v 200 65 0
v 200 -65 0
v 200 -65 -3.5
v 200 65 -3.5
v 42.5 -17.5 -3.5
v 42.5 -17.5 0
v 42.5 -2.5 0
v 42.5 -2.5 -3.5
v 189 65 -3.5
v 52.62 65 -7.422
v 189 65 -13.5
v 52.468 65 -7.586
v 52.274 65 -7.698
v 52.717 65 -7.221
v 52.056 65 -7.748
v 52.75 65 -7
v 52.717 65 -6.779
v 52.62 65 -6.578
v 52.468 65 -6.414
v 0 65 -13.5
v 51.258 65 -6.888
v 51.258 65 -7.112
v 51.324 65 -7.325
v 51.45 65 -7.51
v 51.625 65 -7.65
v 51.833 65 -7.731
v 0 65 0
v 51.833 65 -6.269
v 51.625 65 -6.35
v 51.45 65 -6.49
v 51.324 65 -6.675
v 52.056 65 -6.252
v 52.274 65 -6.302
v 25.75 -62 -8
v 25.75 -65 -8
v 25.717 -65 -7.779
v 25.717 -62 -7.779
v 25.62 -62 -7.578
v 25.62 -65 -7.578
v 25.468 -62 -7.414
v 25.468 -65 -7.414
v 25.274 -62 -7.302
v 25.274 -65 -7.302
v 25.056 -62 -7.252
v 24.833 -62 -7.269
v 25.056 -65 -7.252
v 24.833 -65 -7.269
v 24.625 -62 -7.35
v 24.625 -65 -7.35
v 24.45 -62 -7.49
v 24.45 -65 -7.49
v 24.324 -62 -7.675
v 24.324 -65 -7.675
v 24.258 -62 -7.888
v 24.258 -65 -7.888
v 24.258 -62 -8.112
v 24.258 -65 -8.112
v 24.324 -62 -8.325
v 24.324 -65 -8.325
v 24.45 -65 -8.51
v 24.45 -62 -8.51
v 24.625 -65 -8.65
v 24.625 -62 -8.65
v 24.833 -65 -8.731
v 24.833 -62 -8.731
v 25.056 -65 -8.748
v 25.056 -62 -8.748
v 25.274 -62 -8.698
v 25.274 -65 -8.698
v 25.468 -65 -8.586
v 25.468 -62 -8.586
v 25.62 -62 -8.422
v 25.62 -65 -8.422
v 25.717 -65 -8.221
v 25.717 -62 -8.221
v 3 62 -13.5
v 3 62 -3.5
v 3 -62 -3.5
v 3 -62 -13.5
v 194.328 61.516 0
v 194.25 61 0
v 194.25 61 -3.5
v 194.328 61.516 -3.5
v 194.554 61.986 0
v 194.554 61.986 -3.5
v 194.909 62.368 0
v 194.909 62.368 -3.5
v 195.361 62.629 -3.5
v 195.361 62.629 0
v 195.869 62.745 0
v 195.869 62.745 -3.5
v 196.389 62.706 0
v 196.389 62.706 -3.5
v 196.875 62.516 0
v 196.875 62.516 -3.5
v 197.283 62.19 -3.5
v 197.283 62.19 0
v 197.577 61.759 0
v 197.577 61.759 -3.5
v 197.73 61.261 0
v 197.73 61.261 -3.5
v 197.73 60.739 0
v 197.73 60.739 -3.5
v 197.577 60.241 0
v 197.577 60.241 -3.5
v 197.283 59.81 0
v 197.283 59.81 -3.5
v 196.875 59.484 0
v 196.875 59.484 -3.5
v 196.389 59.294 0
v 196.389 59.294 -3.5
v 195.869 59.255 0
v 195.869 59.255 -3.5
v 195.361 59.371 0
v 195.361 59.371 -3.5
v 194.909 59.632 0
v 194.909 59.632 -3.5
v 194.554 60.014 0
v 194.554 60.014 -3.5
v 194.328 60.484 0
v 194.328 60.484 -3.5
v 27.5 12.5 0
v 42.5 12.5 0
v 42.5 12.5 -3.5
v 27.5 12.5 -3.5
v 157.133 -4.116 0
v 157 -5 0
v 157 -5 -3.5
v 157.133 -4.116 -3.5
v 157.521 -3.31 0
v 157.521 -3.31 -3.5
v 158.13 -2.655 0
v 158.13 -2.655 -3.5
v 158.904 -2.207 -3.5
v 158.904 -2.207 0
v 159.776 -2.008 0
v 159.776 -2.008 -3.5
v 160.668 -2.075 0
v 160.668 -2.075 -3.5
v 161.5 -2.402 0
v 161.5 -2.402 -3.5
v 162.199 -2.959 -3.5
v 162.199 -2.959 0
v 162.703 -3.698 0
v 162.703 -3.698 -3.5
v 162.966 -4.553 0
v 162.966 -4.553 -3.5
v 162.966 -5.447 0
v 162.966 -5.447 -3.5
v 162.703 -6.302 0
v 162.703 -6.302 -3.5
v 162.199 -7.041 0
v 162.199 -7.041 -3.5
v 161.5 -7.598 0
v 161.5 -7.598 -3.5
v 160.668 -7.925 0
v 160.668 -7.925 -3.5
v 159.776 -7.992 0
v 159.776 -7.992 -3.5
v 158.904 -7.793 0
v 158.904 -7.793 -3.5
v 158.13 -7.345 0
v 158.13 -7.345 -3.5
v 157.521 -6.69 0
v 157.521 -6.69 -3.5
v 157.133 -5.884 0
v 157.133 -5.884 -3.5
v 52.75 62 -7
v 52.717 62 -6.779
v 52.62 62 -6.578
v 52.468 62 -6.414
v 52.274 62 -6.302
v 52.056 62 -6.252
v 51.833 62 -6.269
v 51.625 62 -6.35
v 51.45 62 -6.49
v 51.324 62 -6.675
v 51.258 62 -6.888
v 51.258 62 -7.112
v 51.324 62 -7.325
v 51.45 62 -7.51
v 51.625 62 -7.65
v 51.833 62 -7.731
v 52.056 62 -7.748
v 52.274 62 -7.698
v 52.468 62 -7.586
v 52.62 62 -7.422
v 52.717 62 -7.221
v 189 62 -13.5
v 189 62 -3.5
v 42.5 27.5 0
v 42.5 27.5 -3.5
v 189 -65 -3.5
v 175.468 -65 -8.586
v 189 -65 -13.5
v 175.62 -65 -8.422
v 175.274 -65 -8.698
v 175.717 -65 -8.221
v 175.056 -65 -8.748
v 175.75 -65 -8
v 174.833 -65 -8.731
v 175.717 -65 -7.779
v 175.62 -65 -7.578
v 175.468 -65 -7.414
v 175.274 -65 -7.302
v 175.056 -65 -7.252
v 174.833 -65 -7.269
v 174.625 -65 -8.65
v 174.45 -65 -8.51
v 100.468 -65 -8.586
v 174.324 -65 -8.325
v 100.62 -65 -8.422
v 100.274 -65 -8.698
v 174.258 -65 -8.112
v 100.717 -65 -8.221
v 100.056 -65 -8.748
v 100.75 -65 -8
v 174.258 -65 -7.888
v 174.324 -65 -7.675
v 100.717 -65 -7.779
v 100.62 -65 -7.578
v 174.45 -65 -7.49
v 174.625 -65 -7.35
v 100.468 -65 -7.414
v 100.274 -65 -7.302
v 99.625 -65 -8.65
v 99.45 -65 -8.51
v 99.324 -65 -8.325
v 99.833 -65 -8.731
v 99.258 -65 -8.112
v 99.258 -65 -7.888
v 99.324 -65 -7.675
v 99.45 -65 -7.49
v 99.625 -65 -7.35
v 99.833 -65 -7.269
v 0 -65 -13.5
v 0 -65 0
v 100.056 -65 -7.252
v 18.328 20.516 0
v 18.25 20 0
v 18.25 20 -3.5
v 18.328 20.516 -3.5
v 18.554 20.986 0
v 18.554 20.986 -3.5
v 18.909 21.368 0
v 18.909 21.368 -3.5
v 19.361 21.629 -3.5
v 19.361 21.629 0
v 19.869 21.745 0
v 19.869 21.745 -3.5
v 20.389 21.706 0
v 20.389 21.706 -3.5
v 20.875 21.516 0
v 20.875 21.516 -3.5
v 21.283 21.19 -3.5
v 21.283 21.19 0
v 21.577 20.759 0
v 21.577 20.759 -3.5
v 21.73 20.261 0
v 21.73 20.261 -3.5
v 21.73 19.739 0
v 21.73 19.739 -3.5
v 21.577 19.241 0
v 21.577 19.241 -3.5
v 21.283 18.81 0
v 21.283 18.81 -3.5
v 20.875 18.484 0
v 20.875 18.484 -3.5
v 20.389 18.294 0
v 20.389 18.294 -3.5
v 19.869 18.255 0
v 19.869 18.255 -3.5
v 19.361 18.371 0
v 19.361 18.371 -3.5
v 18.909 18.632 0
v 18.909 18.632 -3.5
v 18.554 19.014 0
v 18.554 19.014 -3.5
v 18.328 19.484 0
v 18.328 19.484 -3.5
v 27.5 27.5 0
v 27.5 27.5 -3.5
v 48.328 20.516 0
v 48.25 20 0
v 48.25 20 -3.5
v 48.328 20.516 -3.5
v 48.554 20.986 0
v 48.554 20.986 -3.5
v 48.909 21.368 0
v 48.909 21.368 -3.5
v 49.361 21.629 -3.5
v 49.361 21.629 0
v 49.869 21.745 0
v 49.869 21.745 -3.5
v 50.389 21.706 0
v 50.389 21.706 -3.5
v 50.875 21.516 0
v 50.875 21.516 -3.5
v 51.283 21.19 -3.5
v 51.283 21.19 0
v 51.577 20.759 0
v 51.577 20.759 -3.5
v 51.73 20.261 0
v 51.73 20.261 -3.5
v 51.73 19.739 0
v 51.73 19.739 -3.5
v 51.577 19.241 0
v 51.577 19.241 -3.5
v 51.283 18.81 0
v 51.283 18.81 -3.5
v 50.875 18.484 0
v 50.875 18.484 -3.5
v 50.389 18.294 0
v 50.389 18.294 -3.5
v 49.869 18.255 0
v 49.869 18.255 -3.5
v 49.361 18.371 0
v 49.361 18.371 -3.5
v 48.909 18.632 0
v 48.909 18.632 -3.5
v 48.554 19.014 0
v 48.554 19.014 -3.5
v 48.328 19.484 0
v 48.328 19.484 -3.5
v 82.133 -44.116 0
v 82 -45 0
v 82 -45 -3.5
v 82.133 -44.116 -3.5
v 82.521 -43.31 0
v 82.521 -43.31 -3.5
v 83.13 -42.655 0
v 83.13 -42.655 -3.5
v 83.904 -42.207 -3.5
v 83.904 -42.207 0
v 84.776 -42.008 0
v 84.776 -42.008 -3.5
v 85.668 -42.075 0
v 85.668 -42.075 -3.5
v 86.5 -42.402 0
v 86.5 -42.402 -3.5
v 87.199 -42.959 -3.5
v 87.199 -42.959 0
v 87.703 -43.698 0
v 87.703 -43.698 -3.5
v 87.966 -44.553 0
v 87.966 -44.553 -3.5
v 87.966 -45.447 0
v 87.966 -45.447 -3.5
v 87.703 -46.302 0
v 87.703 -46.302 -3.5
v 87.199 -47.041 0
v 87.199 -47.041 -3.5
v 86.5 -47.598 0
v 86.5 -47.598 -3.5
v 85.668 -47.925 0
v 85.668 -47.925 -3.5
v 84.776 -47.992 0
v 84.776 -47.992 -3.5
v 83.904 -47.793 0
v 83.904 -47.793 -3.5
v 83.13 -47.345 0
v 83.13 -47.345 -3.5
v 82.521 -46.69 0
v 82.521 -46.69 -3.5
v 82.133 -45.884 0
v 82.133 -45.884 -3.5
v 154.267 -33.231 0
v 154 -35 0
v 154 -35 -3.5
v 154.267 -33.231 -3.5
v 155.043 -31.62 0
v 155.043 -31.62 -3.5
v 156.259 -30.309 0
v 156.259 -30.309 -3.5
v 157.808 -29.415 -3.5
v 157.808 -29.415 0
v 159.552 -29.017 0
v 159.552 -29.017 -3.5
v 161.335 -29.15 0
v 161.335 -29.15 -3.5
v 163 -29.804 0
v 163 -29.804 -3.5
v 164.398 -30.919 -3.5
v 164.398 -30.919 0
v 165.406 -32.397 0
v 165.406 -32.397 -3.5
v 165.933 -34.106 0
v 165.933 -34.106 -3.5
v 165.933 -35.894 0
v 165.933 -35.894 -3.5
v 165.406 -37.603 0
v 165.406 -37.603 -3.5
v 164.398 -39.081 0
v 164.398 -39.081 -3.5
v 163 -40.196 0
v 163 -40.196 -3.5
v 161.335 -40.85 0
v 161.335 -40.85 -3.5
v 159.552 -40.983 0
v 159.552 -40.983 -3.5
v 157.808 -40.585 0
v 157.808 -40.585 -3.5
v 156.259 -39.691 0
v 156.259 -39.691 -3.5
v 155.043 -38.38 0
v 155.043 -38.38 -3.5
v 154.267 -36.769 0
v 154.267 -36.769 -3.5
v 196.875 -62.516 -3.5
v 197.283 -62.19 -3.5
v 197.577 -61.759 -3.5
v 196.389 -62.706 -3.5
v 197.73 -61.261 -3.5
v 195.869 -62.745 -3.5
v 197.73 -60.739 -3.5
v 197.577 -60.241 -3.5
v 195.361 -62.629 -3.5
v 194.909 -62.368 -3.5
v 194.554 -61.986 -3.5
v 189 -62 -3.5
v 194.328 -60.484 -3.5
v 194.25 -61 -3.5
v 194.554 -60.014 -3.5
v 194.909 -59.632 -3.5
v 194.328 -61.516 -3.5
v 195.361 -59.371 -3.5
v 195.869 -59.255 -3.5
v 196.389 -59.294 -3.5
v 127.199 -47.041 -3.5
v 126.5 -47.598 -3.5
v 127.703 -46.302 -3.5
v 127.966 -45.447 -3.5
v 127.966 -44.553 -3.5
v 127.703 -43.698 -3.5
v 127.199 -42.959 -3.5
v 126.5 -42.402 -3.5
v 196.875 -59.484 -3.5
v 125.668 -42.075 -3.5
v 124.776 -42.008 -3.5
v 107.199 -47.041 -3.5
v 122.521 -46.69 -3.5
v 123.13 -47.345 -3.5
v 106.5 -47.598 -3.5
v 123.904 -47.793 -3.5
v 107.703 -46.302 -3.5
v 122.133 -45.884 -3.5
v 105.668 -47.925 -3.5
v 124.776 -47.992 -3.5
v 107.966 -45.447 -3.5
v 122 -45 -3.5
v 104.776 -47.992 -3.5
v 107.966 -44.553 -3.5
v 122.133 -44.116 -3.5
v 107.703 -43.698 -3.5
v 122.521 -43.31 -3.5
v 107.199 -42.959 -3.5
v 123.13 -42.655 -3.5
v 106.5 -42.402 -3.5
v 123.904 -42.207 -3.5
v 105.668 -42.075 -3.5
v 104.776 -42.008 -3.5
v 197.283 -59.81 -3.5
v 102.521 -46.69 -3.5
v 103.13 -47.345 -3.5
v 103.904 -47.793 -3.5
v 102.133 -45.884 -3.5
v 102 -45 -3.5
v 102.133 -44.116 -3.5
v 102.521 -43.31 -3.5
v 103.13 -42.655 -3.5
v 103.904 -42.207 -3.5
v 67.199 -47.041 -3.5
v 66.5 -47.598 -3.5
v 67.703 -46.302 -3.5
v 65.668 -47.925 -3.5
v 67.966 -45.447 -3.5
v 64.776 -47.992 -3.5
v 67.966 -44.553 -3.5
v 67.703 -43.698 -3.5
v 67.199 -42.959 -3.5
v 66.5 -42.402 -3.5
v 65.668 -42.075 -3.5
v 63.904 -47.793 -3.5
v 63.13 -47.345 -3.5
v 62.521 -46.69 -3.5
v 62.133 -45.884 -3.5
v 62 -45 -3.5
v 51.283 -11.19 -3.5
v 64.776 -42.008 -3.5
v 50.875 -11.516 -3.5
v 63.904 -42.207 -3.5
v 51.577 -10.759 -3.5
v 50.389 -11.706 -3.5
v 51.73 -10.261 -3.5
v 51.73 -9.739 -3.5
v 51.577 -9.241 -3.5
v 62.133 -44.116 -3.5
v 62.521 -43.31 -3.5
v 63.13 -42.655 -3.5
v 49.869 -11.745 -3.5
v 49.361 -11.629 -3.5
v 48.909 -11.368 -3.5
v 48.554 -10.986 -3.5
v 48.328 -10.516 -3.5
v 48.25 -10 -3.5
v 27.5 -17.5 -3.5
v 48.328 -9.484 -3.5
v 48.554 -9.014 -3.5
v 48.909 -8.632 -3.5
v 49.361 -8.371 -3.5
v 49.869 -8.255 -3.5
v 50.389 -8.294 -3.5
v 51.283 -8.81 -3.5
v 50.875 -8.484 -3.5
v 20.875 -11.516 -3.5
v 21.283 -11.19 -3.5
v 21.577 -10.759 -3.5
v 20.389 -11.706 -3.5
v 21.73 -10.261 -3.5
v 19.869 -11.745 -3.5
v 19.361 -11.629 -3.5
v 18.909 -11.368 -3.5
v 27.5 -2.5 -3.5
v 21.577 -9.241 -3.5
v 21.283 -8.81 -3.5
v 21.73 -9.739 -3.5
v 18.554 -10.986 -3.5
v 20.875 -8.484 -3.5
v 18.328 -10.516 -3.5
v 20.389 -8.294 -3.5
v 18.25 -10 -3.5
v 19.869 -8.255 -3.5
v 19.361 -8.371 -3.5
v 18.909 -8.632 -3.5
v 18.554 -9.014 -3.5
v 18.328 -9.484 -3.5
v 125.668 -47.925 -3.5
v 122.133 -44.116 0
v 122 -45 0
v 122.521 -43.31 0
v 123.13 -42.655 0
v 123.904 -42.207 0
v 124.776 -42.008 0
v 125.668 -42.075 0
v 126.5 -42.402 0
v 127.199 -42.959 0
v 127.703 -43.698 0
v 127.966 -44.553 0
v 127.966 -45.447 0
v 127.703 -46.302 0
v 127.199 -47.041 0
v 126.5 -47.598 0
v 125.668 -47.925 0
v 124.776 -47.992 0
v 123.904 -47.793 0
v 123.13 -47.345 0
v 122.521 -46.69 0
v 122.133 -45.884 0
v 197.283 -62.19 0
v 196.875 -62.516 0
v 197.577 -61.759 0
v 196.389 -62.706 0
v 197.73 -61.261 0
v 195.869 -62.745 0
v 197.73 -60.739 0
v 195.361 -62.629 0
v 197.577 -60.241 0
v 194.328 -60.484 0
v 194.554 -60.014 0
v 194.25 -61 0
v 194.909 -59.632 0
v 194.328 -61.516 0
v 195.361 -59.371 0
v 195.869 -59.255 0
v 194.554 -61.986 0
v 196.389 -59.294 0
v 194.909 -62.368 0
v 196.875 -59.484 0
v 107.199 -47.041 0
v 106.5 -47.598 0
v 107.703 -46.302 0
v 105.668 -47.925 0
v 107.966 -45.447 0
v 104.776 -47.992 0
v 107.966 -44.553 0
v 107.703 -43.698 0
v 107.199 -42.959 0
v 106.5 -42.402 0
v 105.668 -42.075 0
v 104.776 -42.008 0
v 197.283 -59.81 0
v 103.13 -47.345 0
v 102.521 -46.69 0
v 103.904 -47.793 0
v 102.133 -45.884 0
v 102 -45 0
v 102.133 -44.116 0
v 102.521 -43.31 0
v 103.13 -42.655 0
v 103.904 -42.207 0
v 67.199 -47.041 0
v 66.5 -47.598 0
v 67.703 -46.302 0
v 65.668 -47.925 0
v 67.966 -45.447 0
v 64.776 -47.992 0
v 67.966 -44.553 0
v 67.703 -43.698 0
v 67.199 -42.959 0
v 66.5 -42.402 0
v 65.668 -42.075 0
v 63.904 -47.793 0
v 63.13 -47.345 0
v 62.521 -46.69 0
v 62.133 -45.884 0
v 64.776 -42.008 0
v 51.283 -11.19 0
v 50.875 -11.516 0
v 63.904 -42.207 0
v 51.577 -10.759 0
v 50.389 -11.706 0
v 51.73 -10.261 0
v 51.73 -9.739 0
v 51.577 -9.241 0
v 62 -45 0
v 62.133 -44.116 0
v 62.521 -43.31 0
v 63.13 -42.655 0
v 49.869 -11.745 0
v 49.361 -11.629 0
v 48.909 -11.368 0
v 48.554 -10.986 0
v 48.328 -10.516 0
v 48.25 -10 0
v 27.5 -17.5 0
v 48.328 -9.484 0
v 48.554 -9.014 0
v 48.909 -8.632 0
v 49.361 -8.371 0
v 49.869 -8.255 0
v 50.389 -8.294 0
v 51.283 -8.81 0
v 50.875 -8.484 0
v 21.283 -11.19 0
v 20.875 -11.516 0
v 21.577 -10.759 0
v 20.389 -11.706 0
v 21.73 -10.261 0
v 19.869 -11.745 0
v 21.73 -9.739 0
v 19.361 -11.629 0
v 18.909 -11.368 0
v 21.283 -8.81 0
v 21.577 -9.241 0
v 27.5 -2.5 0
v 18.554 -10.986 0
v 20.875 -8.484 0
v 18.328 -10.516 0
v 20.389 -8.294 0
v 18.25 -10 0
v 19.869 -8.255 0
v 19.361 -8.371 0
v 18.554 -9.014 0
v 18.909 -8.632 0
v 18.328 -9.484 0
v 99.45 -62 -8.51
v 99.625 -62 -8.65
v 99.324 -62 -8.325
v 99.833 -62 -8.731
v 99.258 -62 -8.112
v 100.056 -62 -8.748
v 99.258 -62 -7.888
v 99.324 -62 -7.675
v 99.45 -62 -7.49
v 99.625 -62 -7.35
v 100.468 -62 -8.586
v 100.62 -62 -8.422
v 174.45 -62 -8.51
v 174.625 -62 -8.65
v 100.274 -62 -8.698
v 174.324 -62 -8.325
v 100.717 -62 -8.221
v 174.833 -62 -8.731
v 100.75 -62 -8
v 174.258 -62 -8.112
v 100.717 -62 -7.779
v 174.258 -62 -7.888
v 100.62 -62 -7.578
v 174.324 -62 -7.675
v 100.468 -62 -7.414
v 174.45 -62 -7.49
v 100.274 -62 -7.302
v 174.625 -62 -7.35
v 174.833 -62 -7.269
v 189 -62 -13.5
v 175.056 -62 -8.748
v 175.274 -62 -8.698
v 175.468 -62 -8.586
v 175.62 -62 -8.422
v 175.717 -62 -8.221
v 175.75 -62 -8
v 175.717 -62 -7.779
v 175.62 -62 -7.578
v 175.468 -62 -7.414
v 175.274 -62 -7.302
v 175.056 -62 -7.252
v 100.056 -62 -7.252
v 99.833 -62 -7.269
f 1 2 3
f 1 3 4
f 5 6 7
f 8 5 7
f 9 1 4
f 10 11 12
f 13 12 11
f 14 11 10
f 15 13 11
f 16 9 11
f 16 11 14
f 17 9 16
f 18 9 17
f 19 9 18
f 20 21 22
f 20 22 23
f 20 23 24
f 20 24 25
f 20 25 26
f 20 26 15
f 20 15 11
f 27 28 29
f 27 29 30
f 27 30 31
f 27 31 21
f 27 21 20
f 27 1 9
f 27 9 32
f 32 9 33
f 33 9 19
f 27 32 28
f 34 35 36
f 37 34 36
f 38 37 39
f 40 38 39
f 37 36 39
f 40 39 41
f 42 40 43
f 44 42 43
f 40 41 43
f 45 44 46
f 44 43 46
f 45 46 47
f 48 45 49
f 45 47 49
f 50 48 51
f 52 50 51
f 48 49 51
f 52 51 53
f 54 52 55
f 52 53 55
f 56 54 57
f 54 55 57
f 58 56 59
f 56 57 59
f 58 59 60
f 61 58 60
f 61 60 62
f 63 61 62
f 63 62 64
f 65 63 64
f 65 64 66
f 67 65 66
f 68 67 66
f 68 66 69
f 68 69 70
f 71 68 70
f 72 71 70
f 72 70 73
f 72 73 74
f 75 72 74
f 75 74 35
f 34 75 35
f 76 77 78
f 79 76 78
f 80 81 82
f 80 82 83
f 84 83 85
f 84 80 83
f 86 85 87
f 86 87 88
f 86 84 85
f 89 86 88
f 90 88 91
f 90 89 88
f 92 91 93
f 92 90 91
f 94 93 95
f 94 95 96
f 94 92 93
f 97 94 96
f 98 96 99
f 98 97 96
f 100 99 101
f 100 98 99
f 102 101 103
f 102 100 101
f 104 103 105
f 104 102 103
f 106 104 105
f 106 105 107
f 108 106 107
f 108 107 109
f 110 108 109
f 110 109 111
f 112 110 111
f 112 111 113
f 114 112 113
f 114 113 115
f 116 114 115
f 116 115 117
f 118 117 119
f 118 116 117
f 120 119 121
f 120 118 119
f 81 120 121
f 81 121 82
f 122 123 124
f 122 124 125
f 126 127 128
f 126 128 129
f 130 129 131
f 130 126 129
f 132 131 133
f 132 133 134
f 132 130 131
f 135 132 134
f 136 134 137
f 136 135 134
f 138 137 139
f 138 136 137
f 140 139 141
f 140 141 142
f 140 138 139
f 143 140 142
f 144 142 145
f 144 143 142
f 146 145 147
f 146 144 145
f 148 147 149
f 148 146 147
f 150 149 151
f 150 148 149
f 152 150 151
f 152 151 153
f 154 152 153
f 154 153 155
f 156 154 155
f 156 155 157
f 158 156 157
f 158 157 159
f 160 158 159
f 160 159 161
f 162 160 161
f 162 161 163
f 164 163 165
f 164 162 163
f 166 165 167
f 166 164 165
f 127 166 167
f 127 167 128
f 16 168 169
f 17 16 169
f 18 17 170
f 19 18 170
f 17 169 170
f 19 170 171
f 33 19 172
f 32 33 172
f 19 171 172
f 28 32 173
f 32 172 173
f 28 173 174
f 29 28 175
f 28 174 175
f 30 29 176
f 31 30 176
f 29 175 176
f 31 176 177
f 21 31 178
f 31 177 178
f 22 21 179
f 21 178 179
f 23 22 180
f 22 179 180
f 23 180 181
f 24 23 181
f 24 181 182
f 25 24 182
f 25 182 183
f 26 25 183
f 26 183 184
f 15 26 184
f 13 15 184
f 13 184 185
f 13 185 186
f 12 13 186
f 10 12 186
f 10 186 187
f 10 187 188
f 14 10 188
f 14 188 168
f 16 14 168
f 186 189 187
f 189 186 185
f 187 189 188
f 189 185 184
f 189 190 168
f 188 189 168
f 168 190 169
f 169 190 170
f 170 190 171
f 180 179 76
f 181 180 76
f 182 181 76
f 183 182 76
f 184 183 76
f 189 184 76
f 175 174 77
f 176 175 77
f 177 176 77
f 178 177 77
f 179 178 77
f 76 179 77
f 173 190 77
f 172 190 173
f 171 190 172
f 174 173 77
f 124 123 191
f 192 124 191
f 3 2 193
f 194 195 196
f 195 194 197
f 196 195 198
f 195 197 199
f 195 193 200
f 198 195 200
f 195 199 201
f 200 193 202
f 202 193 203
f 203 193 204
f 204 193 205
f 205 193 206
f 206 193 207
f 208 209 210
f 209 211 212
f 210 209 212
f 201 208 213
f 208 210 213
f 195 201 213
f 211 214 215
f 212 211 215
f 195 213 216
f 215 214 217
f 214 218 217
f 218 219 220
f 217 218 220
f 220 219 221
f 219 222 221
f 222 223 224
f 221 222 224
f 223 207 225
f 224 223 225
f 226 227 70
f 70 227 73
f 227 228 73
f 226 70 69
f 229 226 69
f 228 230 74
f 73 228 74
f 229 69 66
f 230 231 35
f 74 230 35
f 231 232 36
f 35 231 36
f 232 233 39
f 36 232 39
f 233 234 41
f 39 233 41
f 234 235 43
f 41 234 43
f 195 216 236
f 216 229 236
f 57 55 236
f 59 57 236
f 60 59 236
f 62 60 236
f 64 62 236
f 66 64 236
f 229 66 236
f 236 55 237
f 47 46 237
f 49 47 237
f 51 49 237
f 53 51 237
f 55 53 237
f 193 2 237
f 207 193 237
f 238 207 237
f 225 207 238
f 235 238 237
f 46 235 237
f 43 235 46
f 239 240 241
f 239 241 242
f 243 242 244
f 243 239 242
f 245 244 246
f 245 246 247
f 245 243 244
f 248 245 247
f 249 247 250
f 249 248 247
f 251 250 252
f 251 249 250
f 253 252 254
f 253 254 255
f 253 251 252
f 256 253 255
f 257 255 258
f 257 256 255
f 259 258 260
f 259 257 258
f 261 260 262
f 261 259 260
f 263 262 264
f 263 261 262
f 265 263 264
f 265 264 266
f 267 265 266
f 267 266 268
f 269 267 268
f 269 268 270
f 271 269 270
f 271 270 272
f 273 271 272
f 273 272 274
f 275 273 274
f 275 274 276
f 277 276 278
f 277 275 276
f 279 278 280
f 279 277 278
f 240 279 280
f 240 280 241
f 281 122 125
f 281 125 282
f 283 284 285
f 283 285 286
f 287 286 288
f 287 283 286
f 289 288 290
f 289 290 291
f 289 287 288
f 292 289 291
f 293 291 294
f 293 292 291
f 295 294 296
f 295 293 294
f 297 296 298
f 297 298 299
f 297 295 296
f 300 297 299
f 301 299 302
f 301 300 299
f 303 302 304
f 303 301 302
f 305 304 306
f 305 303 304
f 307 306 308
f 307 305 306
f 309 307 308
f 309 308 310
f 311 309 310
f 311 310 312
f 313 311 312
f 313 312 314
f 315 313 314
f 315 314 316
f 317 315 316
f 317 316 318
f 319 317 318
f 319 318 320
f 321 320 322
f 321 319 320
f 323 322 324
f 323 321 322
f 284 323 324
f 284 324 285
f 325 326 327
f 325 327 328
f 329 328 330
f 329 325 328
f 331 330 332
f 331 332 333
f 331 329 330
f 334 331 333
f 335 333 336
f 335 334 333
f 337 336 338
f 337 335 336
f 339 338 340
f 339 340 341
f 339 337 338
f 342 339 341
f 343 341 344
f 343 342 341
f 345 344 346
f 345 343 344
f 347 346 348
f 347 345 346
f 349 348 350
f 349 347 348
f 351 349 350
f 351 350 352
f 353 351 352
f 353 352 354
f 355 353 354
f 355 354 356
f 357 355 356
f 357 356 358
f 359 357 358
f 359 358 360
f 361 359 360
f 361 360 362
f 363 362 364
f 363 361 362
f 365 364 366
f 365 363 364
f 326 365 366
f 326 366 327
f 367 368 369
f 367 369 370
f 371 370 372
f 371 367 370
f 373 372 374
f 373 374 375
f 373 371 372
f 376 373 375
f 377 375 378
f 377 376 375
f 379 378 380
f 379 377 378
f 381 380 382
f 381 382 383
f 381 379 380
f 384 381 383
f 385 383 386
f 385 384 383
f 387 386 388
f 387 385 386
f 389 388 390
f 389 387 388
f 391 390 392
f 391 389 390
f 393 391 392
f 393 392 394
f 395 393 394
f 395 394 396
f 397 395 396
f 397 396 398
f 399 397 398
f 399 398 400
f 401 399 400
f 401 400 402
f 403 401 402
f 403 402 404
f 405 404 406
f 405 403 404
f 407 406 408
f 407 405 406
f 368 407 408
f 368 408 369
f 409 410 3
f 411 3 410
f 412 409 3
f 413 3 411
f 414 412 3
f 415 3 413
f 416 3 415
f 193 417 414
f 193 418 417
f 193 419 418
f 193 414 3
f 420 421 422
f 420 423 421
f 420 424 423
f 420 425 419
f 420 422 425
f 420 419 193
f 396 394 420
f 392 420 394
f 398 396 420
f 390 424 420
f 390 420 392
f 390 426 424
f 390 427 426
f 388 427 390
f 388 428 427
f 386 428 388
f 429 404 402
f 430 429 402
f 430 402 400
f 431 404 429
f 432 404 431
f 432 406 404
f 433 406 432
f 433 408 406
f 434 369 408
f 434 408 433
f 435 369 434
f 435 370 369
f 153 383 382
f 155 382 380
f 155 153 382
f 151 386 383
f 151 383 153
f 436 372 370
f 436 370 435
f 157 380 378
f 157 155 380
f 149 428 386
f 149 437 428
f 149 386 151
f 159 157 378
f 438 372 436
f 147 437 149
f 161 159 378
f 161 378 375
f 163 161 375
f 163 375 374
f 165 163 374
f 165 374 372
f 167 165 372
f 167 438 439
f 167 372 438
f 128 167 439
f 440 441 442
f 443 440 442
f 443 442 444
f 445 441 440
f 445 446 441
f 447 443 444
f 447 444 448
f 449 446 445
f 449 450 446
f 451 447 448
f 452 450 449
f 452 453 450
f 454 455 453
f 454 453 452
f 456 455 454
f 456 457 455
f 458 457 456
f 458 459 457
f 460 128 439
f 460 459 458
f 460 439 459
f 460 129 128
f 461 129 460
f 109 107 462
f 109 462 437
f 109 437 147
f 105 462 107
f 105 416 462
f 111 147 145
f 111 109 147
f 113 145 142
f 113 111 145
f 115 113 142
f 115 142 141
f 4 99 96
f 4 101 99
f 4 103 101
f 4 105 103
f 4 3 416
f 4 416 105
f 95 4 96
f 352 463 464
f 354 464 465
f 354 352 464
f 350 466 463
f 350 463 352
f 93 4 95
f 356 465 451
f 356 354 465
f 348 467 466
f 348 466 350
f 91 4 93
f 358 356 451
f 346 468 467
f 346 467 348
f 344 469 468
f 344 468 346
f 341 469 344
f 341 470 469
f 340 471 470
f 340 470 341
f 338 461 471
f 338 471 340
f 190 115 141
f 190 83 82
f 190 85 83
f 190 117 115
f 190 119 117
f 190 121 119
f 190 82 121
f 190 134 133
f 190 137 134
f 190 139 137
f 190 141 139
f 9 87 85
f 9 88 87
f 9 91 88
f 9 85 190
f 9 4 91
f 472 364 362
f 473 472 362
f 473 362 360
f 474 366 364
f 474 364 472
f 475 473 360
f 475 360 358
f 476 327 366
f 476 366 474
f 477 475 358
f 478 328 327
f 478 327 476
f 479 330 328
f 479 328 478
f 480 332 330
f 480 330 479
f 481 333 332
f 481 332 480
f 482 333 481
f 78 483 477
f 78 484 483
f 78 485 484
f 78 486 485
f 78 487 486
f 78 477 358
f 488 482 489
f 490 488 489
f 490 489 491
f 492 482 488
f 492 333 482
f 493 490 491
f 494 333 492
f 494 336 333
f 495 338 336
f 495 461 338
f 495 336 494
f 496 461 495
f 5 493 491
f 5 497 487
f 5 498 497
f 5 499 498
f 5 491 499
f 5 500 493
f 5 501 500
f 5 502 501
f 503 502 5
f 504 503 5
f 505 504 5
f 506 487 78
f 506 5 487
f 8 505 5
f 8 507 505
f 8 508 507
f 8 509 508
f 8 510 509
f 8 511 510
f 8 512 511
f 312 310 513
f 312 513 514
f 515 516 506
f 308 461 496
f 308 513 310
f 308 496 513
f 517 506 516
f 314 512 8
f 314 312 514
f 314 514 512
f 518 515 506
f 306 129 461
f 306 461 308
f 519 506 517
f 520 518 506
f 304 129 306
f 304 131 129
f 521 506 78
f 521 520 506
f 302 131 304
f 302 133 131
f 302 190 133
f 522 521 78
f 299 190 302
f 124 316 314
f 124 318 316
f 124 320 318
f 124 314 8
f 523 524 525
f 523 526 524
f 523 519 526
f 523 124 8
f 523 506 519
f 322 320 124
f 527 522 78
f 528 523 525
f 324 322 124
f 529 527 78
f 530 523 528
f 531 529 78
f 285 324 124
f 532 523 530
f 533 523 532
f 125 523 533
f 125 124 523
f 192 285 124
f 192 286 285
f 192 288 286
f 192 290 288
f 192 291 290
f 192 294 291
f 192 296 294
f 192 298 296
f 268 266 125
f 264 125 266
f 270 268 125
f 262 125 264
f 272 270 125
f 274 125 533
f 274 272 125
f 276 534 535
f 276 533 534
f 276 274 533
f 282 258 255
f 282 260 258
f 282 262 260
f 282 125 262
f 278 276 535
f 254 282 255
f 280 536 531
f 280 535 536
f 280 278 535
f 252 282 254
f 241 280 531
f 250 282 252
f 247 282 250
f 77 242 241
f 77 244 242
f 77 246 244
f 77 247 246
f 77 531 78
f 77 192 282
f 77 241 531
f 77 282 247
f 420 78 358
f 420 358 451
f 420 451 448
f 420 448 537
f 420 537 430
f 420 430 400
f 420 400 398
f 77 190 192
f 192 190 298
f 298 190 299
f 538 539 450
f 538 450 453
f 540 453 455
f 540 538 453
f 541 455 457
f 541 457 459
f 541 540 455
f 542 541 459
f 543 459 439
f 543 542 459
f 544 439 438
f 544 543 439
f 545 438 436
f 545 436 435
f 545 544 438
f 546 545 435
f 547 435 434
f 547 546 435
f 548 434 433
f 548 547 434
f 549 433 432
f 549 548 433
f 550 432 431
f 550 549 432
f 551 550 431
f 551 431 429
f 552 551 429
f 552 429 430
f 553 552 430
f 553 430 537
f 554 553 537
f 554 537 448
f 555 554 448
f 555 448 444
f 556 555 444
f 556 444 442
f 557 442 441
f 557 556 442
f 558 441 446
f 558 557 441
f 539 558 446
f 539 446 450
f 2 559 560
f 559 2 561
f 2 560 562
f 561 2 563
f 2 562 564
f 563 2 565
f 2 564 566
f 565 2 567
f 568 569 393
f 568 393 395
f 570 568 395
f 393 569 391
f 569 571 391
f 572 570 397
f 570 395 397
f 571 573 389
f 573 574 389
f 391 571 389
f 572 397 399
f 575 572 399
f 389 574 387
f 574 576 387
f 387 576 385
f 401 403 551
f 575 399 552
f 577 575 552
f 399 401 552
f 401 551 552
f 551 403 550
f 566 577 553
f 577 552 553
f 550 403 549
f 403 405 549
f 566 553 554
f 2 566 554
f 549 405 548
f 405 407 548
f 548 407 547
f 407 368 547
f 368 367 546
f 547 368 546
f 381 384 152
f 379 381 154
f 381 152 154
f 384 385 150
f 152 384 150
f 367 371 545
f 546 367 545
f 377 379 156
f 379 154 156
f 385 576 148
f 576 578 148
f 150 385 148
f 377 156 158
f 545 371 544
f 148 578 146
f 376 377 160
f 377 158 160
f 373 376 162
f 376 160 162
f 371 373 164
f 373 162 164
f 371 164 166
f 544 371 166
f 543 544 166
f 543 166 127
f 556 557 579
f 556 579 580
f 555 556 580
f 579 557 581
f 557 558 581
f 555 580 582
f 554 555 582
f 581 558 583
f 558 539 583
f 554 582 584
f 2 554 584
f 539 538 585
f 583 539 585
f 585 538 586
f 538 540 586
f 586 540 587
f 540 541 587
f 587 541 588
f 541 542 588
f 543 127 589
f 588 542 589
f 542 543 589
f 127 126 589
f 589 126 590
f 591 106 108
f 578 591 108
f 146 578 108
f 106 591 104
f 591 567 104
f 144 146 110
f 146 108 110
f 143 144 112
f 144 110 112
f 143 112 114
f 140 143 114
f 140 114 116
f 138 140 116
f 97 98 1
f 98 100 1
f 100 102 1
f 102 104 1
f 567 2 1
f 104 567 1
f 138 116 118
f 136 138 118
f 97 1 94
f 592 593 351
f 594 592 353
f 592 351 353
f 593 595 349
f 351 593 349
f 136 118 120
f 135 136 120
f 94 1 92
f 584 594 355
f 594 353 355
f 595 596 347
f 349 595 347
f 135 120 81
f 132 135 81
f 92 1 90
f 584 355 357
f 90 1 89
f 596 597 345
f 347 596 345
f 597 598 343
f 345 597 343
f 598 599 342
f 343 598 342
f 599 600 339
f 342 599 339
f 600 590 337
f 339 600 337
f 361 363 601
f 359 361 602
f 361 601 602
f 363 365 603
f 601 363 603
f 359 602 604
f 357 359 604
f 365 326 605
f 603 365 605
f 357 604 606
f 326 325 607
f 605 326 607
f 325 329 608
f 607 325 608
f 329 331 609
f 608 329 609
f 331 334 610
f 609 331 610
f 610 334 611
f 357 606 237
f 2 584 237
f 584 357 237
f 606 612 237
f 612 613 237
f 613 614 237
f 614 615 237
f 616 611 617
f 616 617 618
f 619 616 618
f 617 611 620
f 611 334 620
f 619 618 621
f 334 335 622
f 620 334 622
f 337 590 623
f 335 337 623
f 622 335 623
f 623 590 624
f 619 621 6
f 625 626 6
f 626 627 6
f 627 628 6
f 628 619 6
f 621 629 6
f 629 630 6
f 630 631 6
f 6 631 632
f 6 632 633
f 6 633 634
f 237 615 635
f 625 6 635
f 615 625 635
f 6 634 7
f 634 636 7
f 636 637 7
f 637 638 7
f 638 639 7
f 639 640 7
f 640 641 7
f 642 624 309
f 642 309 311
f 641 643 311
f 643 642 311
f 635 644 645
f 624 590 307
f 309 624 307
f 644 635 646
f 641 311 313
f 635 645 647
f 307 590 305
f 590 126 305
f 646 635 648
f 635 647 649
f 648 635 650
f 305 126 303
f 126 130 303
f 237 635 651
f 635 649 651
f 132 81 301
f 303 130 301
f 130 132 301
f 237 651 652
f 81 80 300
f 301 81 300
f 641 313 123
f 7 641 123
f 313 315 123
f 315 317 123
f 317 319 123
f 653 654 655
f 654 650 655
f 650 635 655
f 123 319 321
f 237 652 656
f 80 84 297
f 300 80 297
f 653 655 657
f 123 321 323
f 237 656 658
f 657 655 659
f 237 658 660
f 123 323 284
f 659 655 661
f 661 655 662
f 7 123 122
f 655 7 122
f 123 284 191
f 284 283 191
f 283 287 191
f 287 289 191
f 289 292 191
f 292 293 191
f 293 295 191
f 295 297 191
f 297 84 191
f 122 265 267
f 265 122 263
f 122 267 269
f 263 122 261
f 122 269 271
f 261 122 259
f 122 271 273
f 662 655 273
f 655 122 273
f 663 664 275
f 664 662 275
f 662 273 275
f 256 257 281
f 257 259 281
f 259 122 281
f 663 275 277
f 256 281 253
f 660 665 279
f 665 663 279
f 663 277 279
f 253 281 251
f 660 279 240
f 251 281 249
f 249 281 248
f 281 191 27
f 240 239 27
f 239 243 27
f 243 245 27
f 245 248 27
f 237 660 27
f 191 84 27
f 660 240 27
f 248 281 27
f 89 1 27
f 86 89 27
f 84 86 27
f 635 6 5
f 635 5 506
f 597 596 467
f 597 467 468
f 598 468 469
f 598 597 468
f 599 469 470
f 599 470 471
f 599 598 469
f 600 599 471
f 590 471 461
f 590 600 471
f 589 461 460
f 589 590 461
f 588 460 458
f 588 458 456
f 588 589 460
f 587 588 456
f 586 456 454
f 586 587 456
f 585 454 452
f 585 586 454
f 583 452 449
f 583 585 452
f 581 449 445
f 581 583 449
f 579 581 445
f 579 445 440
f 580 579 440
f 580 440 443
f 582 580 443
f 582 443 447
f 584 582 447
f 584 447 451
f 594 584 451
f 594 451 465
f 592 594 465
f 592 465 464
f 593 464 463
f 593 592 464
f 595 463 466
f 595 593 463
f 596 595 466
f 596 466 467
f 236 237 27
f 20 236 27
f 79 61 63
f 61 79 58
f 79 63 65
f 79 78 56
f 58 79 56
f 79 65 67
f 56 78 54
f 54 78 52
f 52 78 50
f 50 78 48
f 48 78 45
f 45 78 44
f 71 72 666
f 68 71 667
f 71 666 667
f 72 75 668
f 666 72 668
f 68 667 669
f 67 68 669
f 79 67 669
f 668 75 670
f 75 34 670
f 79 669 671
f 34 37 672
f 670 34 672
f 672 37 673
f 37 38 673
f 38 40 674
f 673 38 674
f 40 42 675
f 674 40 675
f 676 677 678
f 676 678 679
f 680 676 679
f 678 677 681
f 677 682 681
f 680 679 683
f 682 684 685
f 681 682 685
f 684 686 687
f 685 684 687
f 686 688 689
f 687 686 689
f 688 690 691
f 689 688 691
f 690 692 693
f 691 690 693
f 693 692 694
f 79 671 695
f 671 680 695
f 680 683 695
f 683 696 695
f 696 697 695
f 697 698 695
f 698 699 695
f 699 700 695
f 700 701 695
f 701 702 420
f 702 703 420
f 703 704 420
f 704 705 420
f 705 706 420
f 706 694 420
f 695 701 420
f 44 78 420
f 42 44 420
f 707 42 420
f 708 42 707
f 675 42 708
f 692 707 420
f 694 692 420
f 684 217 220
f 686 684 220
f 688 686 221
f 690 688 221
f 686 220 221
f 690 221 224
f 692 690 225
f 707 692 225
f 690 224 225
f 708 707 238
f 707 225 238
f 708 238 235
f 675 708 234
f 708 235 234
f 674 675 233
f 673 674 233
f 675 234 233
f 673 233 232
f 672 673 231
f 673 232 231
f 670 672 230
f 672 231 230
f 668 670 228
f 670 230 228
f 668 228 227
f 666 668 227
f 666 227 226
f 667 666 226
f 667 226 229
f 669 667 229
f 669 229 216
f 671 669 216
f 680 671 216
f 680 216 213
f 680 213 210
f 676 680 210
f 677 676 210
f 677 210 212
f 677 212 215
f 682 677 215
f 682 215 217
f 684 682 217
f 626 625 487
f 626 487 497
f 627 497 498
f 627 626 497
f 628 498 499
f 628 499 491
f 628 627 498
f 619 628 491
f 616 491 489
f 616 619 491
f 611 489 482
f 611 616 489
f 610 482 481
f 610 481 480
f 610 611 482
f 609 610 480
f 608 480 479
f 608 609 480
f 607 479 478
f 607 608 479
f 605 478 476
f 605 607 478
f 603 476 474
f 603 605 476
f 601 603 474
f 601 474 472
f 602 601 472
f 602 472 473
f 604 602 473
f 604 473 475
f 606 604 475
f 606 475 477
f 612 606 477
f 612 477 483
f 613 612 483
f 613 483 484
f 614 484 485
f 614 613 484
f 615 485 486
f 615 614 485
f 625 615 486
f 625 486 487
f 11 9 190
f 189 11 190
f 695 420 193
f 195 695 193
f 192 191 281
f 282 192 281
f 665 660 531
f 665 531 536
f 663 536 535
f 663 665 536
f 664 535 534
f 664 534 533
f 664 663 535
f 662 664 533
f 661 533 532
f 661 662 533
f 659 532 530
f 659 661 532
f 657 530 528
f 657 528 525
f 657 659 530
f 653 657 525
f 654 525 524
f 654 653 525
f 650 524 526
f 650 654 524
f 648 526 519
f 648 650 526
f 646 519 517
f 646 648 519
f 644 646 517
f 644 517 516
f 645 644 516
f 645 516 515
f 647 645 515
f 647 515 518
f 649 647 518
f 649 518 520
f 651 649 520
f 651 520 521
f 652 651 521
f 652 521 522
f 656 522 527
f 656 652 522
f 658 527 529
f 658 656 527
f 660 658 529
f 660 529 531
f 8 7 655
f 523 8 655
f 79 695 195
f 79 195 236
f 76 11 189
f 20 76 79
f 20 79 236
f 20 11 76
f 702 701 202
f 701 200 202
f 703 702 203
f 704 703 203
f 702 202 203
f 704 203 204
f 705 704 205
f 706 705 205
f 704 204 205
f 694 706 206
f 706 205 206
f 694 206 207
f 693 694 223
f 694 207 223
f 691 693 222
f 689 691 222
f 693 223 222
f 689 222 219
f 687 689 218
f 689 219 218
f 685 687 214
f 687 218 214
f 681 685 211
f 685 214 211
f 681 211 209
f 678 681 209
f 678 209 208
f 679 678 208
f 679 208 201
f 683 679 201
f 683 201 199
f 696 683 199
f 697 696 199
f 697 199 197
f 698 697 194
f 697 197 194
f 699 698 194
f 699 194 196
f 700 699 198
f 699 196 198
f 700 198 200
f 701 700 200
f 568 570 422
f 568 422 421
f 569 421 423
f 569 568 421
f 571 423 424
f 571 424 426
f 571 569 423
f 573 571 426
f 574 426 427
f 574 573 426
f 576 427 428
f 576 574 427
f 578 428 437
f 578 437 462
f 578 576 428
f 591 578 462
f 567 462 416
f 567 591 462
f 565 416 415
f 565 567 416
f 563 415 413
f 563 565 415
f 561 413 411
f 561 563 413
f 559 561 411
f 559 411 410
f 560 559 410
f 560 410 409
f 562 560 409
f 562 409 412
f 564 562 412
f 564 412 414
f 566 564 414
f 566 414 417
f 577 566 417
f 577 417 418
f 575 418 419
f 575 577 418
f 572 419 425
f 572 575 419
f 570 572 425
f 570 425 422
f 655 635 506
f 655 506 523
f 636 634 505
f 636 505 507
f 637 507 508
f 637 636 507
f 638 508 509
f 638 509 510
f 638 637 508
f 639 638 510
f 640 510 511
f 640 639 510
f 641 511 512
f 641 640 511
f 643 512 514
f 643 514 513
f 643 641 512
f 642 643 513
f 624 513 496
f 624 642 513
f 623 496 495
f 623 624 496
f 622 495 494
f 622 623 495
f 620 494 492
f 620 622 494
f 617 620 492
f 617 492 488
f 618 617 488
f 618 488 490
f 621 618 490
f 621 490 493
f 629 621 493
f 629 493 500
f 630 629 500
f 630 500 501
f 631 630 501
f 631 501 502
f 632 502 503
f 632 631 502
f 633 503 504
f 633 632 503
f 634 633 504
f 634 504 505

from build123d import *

# Parameters (mm, degrees)
COPYSKETCH010_W   = 200
COPYSKETCH010_H   = 130
COPYSKETCH010_R   = 1.75
COPYSKETCH010_R_2 = 3
COPYSKETCH010_R_3 = 6
COPYSKETCH010_W_2 = 15
COPYSKETCH010_H_2 = 15
PAD_DEPTH         = 3.5
PAD001_DEPTH      = 13.5
SKETCH001_R       = 0.75
POCKET_DEPTH      = 100
SKETCH002_R       = 0.75
POCKET001_DEPTH   = 5


with BuildPart() as part:
    # CopySketch010 → Pad (new body)
    with BuildSketch(Plane(origin=(0, 0, 0), x_dir=(-1, 0, 0), z_dir=(0, 0, -1))):
        with Locations((-100, 0)):
            Rectangle(COPYSKETCH010_W, COPYSKETCH010_H)
        with Locations((-196, 61)):
            Circle(COPYSKETCH010_R, mode=Mode.SUBTRACT)
        with Locations((-196, -61)):
            Circle(COPYSKETCH010_R, mode=Mode.SUBTRACT)
        with Locations((-125, -45)):
            Circle(COPYSKETCH010_R_2, mode=Mode.SUBTRACT)
        with Locations((-105, -45)):
            Circle(COPYSKETCH010_R_2, mode=Mode.SUBTRACT)
        with Locations((-85, -45)):
            Circle(COPYSKETCH010_R_2, mode=Mode.SUBTRACT)
        with Locations((-65, -45)):
            Circle(COPYSKETCH010_R_2, mode=Mode.SUBTRACT)
        with Locations((-50, -10)):
            Circle(COPYSKETCH010_R, mode=Mode.SUBTRACT)
        with Locations((-20, -10)):
            Circle(COPYSKETCH010_R, mode=Mode.SUBTRACT)
        with Locations((-50, 20)):
            Circle(COPYSKETCH010_R, mode=Mode.SUBTRACT)
        with Locations((-20, 20)):
            Circle(COPYSKETCH010_R, mode=Mode.SUBTRACT)
        with Locations((-160, -35)):
            Circle(COPYSKETCH010_R_3, mode=Mode.SUBTRACT)
        with Locations((-160, -5)):
            Circle(COPYSKETCH010_R_2, mode=Mode.SUBTRACT)
        with Locations((-35, -10)):
            Rectangle(COPYSKETCH010_W_2, COPYSKETCH010_H_2, mode=Mode.SUBTRACT)
        with Locations((-35, 20)):
            Rectangle(COPYSKETCH010_W_2, COPYSKETCH010_H_2, mode=Mode.SUBTRACT)
    extrude(amount=PAD_DEPTH)

    # Sketch → Pad001 (join)
    with BuildSketch(Plane.XY):
        Polygon((0, 65), (189, 65), (189, 62), (3, 62), (3, -62), (189, -62), (189, -65), (0, -65), align=None)
    extrude(amount=-PAD001_DEPTH)

    # Sketch001 → Pocket (cut, symmetric)
    with BuildSketch(Plane.XZ.offset(65)):
        with Locations((25, -8)):
            Circle(SKETCH001_R)
        with Locations((100, -8)):
            Circle(SKETCH001_R)
        with Locations((175, -8)):
            Circle(SKETCH001_R)
    extrude(amount=POCKET_DEPTH, both=True, mode=Mode.SUBTRACT)

    # Sketch002 → Pocket001 (cut)
    with BuildSketch(Plane.XZ.offset(-60)):
        with Locations((52, -7)):
            Circle(SKETCH002_R)
    extrude(amount=-POCKET001_DEPTH, mode=Mode.SUBTRACT)


solid = part.part
